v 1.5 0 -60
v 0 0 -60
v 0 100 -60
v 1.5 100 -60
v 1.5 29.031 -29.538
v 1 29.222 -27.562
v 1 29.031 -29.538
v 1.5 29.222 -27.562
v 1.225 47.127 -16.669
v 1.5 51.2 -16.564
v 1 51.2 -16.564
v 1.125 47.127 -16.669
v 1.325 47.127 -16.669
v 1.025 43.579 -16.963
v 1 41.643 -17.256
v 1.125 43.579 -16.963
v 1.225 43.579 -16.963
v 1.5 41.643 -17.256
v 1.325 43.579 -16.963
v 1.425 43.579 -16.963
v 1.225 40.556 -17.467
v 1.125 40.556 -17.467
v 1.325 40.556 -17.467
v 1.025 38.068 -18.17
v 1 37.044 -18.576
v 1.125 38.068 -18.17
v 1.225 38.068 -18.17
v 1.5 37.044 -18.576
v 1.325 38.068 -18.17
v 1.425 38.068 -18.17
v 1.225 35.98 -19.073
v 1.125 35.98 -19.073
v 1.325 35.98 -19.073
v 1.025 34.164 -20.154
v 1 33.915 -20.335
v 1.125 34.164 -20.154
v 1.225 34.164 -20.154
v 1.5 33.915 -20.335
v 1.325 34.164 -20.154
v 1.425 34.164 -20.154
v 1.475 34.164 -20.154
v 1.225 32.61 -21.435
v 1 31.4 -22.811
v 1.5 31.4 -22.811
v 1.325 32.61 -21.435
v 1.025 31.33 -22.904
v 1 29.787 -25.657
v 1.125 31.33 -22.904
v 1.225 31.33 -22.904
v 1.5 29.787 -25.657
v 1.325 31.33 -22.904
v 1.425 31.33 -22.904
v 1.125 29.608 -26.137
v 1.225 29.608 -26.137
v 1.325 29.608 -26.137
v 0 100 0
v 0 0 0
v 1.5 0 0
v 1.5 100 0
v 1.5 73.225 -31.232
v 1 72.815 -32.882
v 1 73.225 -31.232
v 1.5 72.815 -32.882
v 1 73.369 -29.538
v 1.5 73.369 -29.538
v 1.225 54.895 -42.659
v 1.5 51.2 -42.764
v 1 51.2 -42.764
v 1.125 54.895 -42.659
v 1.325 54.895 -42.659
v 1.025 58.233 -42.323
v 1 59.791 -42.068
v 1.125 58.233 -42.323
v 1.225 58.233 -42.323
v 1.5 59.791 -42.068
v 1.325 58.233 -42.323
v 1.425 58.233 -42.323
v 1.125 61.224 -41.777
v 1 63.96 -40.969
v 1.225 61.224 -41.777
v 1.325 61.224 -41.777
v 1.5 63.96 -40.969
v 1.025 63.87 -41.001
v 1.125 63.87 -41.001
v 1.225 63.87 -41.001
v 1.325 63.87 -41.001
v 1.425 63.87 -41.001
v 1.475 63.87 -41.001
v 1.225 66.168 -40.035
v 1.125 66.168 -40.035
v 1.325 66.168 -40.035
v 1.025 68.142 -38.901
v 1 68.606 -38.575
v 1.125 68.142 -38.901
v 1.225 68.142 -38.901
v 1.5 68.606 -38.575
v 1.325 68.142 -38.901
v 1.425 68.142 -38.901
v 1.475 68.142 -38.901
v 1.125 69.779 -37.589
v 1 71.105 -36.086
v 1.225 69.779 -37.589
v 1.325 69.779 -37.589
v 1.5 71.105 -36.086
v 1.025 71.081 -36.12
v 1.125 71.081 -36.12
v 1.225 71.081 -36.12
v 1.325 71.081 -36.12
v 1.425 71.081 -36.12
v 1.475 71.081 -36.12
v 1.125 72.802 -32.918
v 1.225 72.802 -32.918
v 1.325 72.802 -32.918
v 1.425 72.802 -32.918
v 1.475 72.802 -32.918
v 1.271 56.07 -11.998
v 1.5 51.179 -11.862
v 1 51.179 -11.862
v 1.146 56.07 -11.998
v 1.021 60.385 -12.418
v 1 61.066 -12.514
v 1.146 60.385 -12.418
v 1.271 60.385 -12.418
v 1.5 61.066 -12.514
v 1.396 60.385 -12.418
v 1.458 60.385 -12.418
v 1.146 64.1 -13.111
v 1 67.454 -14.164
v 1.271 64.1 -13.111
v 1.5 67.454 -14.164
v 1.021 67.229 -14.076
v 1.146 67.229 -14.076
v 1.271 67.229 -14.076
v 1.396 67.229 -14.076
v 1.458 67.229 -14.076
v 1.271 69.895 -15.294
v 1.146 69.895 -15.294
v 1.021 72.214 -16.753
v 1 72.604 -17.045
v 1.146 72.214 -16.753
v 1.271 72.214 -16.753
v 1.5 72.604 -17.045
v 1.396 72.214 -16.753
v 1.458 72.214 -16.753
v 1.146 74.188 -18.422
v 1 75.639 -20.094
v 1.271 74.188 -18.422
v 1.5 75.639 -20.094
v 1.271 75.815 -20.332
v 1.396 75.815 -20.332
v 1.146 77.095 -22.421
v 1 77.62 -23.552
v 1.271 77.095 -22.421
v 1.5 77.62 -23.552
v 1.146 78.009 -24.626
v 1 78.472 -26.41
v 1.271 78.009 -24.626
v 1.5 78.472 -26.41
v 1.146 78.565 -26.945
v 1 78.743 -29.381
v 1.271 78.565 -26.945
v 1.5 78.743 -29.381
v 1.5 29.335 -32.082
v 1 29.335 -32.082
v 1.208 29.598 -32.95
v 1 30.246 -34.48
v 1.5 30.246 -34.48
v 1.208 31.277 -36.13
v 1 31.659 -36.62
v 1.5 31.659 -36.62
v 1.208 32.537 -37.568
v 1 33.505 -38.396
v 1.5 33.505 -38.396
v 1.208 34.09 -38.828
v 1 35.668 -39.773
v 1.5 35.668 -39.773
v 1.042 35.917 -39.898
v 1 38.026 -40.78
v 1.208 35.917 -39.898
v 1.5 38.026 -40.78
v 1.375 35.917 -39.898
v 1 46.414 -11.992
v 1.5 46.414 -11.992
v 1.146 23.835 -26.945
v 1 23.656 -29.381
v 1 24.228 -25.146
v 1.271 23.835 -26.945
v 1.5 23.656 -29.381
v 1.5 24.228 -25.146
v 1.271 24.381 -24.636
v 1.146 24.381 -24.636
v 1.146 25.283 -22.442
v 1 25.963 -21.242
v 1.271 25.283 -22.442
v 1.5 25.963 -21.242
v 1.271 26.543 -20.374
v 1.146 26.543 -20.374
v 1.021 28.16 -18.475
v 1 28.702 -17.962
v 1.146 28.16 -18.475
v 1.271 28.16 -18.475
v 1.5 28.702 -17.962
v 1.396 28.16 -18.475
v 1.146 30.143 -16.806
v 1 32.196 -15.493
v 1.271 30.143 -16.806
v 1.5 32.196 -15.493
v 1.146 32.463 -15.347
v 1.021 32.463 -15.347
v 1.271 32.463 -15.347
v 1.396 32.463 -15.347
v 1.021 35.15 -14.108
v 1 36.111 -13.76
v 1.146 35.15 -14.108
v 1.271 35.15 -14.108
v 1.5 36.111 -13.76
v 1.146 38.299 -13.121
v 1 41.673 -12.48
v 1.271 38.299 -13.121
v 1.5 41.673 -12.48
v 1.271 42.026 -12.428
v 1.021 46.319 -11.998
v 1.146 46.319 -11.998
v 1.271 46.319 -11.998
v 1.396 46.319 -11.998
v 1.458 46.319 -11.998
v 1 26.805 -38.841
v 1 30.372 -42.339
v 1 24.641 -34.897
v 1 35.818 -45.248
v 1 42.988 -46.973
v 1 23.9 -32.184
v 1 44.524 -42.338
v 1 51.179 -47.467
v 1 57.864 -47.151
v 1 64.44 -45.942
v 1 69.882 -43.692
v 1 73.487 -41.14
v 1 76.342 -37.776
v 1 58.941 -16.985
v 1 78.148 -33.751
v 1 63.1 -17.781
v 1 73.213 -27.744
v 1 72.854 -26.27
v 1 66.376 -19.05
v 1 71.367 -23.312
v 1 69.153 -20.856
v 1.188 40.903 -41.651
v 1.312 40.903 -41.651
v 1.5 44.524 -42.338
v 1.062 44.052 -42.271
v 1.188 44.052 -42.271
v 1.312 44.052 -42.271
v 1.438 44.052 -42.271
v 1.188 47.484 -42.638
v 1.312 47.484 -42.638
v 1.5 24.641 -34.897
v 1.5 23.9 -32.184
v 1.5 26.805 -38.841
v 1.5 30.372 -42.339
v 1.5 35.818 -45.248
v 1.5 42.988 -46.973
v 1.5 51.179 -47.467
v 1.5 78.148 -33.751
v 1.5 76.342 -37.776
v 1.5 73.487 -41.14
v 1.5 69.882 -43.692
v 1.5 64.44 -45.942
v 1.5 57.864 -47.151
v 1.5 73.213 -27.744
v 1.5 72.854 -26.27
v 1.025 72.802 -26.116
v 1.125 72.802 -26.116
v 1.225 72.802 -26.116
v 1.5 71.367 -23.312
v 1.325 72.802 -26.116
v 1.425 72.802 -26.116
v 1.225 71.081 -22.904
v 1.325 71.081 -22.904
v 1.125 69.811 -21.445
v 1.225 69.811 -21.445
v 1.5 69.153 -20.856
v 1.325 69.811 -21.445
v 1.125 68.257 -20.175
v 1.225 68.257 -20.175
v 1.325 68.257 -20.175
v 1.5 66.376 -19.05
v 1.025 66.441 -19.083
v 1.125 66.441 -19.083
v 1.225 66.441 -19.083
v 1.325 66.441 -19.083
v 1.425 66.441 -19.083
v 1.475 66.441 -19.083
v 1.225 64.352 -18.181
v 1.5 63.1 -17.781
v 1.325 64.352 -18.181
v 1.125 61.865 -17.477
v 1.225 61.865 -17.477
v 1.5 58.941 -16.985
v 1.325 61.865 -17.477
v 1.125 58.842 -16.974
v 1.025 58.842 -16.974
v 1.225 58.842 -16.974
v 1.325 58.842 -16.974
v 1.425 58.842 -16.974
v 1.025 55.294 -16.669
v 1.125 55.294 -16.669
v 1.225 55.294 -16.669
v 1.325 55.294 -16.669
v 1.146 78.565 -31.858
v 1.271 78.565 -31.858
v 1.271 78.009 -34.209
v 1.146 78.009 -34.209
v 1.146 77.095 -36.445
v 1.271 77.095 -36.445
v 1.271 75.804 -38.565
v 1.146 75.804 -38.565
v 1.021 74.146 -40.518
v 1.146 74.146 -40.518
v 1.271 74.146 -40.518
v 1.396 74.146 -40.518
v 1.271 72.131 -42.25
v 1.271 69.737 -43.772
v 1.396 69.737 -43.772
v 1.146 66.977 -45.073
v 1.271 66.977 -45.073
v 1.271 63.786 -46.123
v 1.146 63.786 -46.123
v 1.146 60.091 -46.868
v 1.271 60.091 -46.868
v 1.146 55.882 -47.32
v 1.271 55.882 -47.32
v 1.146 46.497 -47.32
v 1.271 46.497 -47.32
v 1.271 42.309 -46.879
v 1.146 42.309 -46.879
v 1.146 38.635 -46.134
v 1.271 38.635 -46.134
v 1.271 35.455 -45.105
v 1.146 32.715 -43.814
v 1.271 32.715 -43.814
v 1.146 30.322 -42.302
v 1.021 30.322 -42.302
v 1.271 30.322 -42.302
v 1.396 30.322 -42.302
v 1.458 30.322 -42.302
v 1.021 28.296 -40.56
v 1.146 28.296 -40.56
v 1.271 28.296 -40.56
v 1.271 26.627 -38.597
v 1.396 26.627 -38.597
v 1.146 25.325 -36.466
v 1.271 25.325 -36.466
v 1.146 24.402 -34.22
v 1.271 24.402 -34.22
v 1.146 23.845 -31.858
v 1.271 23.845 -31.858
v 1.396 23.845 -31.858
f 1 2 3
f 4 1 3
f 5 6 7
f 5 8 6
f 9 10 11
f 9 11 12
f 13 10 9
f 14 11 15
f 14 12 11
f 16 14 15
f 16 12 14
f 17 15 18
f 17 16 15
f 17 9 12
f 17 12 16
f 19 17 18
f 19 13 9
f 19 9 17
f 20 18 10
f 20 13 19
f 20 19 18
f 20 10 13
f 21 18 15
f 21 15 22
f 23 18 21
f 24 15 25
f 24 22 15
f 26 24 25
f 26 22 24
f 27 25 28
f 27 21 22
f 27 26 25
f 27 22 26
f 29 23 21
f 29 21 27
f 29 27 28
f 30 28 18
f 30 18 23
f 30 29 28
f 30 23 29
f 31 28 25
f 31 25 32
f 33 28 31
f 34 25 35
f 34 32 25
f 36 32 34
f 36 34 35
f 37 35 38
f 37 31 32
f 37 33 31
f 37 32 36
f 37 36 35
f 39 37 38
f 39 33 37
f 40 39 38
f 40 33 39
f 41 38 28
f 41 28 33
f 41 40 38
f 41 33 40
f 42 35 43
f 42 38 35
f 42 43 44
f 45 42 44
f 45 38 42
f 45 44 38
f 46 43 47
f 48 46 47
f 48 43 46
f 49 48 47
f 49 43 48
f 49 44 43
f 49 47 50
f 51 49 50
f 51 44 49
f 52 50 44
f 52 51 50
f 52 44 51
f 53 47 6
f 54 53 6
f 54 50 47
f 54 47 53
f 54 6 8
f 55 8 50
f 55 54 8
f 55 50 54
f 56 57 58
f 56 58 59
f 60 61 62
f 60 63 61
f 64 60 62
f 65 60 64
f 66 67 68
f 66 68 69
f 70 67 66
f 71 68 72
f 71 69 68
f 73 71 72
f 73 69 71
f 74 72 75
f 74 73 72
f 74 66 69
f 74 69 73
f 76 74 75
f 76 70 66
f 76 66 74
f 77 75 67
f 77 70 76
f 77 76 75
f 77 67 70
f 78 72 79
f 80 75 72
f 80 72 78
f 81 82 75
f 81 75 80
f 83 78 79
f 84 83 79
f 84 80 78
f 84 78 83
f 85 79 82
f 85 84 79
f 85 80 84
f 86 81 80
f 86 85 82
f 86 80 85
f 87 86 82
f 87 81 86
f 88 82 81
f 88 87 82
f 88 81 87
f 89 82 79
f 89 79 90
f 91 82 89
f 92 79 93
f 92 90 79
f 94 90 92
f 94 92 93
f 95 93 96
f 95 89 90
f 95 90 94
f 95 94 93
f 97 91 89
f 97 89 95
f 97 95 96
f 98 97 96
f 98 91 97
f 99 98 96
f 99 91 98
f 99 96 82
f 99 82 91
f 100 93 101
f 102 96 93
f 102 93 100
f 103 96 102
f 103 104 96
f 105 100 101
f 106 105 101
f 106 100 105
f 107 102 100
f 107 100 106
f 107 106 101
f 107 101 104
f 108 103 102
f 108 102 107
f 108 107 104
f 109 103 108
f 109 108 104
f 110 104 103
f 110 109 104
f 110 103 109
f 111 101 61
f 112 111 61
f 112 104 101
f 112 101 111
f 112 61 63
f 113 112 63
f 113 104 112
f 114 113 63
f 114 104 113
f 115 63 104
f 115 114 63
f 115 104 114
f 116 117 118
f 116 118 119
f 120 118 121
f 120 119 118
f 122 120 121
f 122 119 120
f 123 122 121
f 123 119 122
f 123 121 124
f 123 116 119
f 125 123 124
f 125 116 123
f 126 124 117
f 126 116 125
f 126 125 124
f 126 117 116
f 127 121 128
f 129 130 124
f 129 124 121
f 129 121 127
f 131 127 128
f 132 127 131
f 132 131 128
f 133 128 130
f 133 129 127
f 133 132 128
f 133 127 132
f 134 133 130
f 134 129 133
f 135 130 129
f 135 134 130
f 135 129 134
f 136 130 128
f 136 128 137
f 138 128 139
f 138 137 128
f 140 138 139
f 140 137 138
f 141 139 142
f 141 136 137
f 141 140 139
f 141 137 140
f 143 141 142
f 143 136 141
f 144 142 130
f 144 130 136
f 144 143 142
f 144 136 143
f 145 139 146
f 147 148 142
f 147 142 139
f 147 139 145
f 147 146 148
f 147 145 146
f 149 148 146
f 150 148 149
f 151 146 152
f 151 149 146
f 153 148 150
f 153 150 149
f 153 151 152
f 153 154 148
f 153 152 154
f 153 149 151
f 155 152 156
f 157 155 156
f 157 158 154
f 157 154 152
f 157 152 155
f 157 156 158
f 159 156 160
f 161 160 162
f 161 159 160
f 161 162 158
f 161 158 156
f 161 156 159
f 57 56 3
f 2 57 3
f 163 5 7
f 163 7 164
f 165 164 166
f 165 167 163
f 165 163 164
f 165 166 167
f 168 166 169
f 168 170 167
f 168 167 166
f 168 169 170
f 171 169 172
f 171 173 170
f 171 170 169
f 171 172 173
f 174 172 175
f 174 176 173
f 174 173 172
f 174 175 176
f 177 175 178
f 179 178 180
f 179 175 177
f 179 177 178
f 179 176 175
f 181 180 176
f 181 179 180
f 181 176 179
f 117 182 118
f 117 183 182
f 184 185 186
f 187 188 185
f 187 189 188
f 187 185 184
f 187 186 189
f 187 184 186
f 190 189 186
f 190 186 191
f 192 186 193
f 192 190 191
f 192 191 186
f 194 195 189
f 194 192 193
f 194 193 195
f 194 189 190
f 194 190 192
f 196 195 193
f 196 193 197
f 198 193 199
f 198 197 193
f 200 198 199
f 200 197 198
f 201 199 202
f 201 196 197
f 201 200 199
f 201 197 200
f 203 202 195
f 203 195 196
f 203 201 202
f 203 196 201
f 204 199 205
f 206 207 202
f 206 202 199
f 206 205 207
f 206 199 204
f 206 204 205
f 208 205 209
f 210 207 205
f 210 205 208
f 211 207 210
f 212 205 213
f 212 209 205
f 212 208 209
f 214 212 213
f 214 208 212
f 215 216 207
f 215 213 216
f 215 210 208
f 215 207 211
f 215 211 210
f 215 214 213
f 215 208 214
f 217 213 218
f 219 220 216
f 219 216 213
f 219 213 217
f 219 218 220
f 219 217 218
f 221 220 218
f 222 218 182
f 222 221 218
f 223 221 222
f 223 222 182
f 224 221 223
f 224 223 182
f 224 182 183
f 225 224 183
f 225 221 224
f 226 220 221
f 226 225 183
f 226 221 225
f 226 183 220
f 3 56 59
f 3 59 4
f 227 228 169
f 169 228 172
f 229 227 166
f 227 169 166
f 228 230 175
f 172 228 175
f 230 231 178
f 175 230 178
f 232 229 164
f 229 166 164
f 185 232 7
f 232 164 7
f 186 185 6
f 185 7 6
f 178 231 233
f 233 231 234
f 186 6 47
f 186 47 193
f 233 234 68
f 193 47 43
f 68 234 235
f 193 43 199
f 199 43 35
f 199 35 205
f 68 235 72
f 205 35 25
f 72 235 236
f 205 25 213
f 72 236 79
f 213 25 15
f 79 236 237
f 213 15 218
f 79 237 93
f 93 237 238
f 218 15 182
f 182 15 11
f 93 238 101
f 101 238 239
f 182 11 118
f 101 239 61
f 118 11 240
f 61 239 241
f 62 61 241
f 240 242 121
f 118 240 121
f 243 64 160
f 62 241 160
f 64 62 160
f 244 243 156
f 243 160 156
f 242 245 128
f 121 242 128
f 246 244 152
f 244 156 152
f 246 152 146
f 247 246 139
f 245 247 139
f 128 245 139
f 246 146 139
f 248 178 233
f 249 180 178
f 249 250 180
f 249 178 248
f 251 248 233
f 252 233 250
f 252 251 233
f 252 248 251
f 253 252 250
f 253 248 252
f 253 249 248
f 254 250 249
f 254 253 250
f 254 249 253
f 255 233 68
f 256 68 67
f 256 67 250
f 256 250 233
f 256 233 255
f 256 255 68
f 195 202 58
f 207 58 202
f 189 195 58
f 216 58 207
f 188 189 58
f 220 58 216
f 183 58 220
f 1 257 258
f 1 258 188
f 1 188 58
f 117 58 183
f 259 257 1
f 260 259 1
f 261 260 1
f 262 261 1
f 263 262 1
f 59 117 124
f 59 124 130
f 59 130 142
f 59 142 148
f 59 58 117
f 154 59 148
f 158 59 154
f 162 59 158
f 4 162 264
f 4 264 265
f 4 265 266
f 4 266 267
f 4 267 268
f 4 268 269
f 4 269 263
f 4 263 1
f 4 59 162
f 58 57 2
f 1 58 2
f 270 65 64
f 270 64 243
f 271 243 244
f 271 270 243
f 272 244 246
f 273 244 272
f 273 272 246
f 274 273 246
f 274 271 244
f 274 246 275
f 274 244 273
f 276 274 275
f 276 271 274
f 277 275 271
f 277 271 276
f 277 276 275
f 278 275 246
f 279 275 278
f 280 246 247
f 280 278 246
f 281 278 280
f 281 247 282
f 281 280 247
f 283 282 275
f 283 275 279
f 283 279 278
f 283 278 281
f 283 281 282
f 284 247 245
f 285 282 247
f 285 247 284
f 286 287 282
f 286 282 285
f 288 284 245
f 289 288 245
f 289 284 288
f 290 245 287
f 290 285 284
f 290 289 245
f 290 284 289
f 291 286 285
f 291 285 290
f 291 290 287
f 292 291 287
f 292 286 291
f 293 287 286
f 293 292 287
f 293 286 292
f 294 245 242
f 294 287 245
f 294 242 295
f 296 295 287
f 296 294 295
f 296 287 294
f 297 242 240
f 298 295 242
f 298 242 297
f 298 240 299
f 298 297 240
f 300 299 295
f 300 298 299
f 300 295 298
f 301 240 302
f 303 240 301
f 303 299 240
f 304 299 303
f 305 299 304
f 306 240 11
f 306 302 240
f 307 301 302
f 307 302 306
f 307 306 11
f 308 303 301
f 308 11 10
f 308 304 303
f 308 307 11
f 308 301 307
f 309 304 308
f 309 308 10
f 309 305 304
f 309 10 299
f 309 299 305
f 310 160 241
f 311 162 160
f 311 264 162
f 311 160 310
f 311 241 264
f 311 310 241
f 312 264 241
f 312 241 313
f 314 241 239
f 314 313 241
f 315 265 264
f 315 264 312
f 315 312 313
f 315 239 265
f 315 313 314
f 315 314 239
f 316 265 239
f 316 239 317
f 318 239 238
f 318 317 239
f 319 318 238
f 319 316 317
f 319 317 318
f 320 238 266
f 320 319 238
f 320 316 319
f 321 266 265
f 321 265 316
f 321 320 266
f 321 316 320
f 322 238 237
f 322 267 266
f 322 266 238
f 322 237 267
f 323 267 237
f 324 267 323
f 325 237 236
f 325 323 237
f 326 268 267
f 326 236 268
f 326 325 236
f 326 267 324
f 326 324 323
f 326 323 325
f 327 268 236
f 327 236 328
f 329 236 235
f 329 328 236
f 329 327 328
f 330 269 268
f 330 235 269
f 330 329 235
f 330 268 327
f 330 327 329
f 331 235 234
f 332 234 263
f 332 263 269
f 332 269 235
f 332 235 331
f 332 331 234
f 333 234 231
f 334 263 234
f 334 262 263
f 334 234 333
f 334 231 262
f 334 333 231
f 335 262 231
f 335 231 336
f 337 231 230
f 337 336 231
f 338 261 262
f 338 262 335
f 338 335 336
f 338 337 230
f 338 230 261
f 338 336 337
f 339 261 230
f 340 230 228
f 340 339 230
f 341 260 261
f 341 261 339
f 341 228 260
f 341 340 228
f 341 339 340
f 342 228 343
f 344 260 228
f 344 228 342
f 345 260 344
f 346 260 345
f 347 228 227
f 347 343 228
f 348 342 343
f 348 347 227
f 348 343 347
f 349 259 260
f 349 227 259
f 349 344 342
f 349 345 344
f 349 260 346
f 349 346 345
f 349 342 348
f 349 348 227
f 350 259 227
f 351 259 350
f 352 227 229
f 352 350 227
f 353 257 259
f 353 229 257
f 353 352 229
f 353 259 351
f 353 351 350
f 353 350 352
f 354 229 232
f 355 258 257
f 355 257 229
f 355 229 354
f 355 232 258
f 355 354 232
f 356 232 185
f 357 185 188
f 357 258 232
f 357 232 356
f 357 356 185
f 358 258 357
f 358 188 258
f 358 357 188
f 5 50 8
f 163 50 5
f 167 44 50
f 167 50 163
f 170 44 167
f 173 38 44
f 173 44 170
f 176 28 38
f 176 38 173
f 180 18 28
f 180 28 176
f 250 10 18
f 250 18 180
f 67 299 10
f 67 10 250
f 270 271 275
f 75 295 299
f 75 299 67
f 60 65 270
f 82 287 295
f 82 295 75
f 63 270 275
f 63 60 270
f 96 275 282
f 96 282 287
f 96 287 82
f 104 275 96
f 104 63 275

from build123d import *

# Parameters (mm, degrees)
SKETCH1_W           = 60
SKETCH1_H           = 100
BOSS_EXTRUDE1_DEPTH = 1.5
CUT_EXTRUDE1_DEPTH  = 0.5


with BuildPart() as part:
    # Sketch1 → Boss-Extrude1 (new body)
    with BuildSketch(Plane(origin=(0, 0, 0), x_dir=(0, 0, -1), z_dir=(1, 0, 0))):
        with Locations((30, 50)):
            Rectangle(SKETCH1_W, SKETCH1_H)
    extrude(amount=BOSS_EXTRUDE1_DEPTH)

    # Sketch2 → Cut-Extrude1 (cut)
    with BuildSketch(Plane(origin=(1.5, 0, 0), x_dir=(0, 0, -1), z_dir=(1, 0, 0))):
        with BuildLine():
            add(Edge.make_bspline(
                [(11.861572266, 51.178957621), (11.866483157, 52.01881409), (11.876022634, 53.650247385), (11.982146224, 56.027475881), (12.158439592, 58.257620052), (12.400038666, 60.340786644), (12.694046737, 62.277513452), (13.08652929, 64.062624774), (13.532868703, 65.704382682), (14.050167214, 67.208140834), (14.633869024, 68.594158719), (15.269169344, 69.888065036), (15.981280939, 71.087902015), (16.729505327, 72.212819981), (17.544130252, 73.244404803), (18.401973402, 74.197224604), (19.336516322, 75.049258251), (20.315990392, 75.825470017), (21.349263533, 76.505912268), (22.406883193, 77.105258438), (23.496129033, 77.617278353), (24.619974934, 78.019865843), (25.768319661, 78.352393329), (26.945177551, 78.57979315), (28.152491721, 78.722873456), (28.967406541, 78.736552342), (29.380690257, 78.743489583)],
                knots=[0, 0, 0, 0, 1.646270934, 3.197905019, 4.663502075, 6.030701355, 7.308322542, 8.50163776, 9.611534131, 10.641858119, 11.616356847, 12.558055219, 13.465016945, 14.349605745, 15.204443733, 16.039544428, 16.859896111, 17.680448484, 18.487036065, 19.28249412, 20.06191084, 20.843045899, 21.620316918, 22.403196591, 23.190181807, 24, 24, 24, 24], degree=3))
            add(Edge.make_bspline(
                [(29.380690257, 78.743489583), (29.797426358, 78.736186307), (30.626183347, 78.721662388), (31.851448395, 78.582069908), (33.048407114, 78.350445526), (34.211956508, 78.022257832), (35.351654181, 77.61510046), (36.458585764, 77.104768572), (37.539626914, 76.510720351), (38.577598427, 75.812695603), (39.583895365, 75.034448119), (40.53380024, 74.15468866), (41.427399518, 73.182300389), (42.275908223, 72.127687021), (43.055253425, 70.97062105), (43.797437142, 69.731226973), (44.46174867, 68.387830244), (45.101546615, 66.962845324), (45.653796473, 65.416843713), (46.151838759, 63.758540103), (46.554254567, 61.968347042), (46.889453334, 60.055657106), (47.149130721, 58.01344602), (47.338259067, 55.846091507), (47.438164497, 53.552167648), (47.456979074, 51.983795915), (47.466634115, 51.178957621)],
                knots=[0, 0, 0, 0, 0.810914788, 1.612654377, 2.396697861, 3.181598691, 3.963628158, 4.749916497, 5.551656086, 6.361998678, 7.18212741, 8.025565596, 8.878627764, 9.750805457, 10.657531673, 11.591944965, 12.560506719, 13.57287815, 14.630710178, 15.753379473, 16.941251878, 18.199788006, 19.531962791, 20.947069417, 22.433333509, 24, 24, 24, 24], degree=3))
            add(Edge.make_bspline(
                [(47.466634115, 51.178957621), (47.456878981, 50.37762975), (47.437871502, 48.816275072), (47.339379047, 46.532672726), (47.145370188, 44.376820324), (46.902683958, 42.343547476), (46.566561596, 40.441316956), (46.153273591, 38.663546241), (45.694395327, 37.002558092), (45.127955466, 35.471959765), (44.507979129, 34.050399477), (43.833439735, 32.722928074), (43.110772828, 31.477812184), (42.323445656, 30.325018121), (41.484247548, 29.256379647), (40.575217204, 28.290759896), (39.621979364, 27.404892058), (38.612721076, 26.616623447), (37.558561531, 25.926669372), (36.481233359, 25.309640305), (35.361621363, 24.812100312), (34.225098132, 24.38489078), (33.055407059, 24.05850748), (31.854006192, 23.83283075), (30.627006546, 23.674555371), (29.797567518, 23.662481237), (29.380690257, 23.65641276)],
                knots=[0, 0, 0, 0, 1.561518951, 3.042555995, 4.452378317, 5.7783523, 7.031515105, 8.214008947, 9.334062868, 10.386615937, 11.391082383, 12.354592575, 13.286541444, 14.194233754, 15.072674879, 15.931287219, 16.775624067, 17.606195743, 18.42308326, 19.229000347, 20.022332153, 20.807536673, 21.593273796, 22.3848459, 23.188221202, 24, 24, 24, 24], degree=3))
            add(Edge.make_bspline(
                [(29.380690257, 23.65641276), (28.967418006, 23.663394755), (28.152525794, 23.677161885), (26.945046018, 23.819595771), (25.773048192, 24.048590878), (24.630748974, 24.369227439), (23.512287804, 24.761700257), (22.43290541, 25.273028738), (21.380600335, 25.861914845), (20.358180088, 26.532565047), (19.384856977, 27.300922528), (18.455153875, 28.150763438), (17.592426626, 29.103295021), (16.789449091, 30.143476845), (16.026295593, 31.261739303), (15.324295998, 32.473350402), (14.674973564, 33.773505919), (14.081454981, 35.170605749), (13.555230257, 36.685036704), (13.090402579, 38.334124188), (12.723391305, 40.132423503), (12.409247074, 42.06549134), (12.155865354, 44.141634314), (11.98288092, 46.361979541), (11.875965432, 48.725143407), (11.866457538, 50.346093579), (11.861572266, 51.178957621)],
                knots=[0, 0, 0, 0, 0.810891512, 1.598919785, 2.382837074, 3.152667961, 3.926044502, 4.706494248, 5.493654104, 6.291793342, 7.103789334, 7.925228297, 8.761435821, 9.622817696, 10.50288917, 11.416980706, 12.369136599, 13.353924996, 14.394355917, 15.514179734, 16.714354668, 17.994756427, 19.357759367, 20.818452758, 22.365282078, 24, 24, 24, 24], degree=3))
        make_face()
        with BuildLine():
            add(Edge.make_bspline(
                [(16.564127604, 51.199951172), (16.565915894, 50.500057671), (16.569386614, 49.141701818), (16.660056419, 47.167823532), (16.783573948, 45.326785469), (16.942889072, 43.616249997), (17.179481346, 42.042007029), (17.444576761, 40.593229331), (17.767181844, 39.277584005), (18.148877972, 38.086043002), (18.583633926, 36.998384689), (19.058315115, 35.986299812), (19.568251845, 35.037832588), (20.138948921, 34.161502485), (20.760487566, 33.354451704), (21.418828848, 32.602395844), (22.138542767, 31.931722288), (23.134196943, 31.127356015), (24.448633139, 30.296156819), (26.104776297, 29.572348137), (27.80655222, 29.117480208), (28.961614497, 29.05963437), (29.538141886, 29.030761719)],
                knots=[0, 0, 0, 0, 1.459021318, 2.831673884, 4.118529203, 5.306027144, 6.411944654, 7.436330062, 8.375795394, 9.233974572, 10.042671642, 10.816086306, 11.563610507, 12.285937304, 12.993564865, 13.685989202, 14.367179055, 15.041617293, 16.353048772, 17.594441528, 18.799311195, 20, 20, 20, 20], degree=3))
            add(Edge.make_bspline(
                [(29.538141886, 29.030761719), (30.118398518, 29.054682735), (31.277713767, 29.102475381), (32.971485144, 29.563575618), (34.615798123, 30.259289713), (35.904415627, 31.081930832), (36.884781023, 31.865359219), (37.58719408, 32.533302994), (38.23189326, 33.281212299), (38.843356327, 34.088160254), (39.404171158, 34.969563803), (39.91414404, 35.921184585), (40.379505291, 36.945665225), (40.644634513, 37.660845129), (40.780188243, 38.026498159)],
                knots=[0, 0, 0, 0, 1.353760809, 2.704726607, 4.075137775, 5.516104923, 6.260822281, 7.007110065, 7.778089737, 8.566572457, 9.372053459, 10.217411131, 11.088608312, 12, 12, 12, 12], degree=3))
            add(Edge.make_bspline(
                [(40.780188243, 38.026498159), (40.938162986, 38.494051101), (41.258919464, 39.443384088), (41.6723064, 40.916025735), (41.997865484, 42.461115664), (42.290756471, 44.069420128), (42.490670421, 45.752799943), (42.65158024, 47.506046538), (42.746359491, 49.330481818), (42.758108313, 50.570038805), (42.764078776, 51.199951172)],
                knots=[0, 0, 0, 0, 0.884706709, 1.796334032, 2.740027952, 3.714592787, 4.726048262, 5.777819803, 6.87074269, 8, 8, 8, 8], degree=3))
            add(Edge.make_bspline(
                [(42.764078776, 51.199951172), (42.755841673, 51.829761655), (42.739728137, 53.061805598), (42.678135979, 54.866131568), (42.519086189, 56.579874281), (42.342436853, 58.210416604), (42.081976085, 59.748732555), (41.801145443, 61.20770012), (41.423847996, 62.569244583), (41.020821259, 63.854682782), (40.559546483, 65.049410354), (40.051780436, 66.158997545), (39.509489973, 67.188801219), (38.920481528, 68.135995951), (38.29174733, 69.004824402), (37.606692727, 69.777866606), (36.892491448, 70.479081622), (35.892144588, 71.279491165), (34.582531947, 72.095607599), (32.952960149, 72.84665929), (31.25713995, 73.277959781), (30.110728088, 73.338768925), (29.538141886, 73.369140625)],
                knots=[0, 0, 0, 0, 1.31362396, 2.569729283, 3.763502607, 4.902122613, 5.988968491, 7.01645872, 7.998833611, 8.933434873, 9.825090667, 10.667526885, 11.477055099, 12.250526234, 12.991942729, 13.710640831, 14.402115721, 15.076753259, 16.378508321, 17.609869233, 18.806226677, 20, 20, 20, 20], degree=3))
            add(Edge.make_bspline(
                [(29.538141886, 73.369140625), (28.958590102, 73.338727023), (27.798430729, 73.277844414), (26.084984543, 72.848266218), (24.442556739, 72.099502066), (23.13640721, 71.27678808), (22.135362672, 70.493210249), (21.430468804, 69.81371146), (20.769538772, 69.070437494), (20.160686339, 68.25596463), (19.590436419, 67.380656191), (19.066721664, 66.437626156), (18.594863093, 65.422095624), (18.159426849, 64.334925875), (17.776566393, 63.14348767), (17.460760218, 61.8294629), (17.169011738, 60.385293269), (16.96247724, 58.802524157), (16.778871639, 57.091560249), (16.660876821, 55.245926125), (16.569083308, 53.268737372), (16.565812591, 51.903358229), (16.564127604, 51.199951172)],
                knots=[0, 0, 0, 0, 1.207732386, 2.417664972, 3.655092373, 4.956220595, 5.625982001, 6.301752483, 6.994047911, 7.697131622, 8.419323945, 9.170223765, 9.943494443, 10.752040957, 11.610060368, 12.549350801, 13.567764191, 14.679664412, 15.874934091, 17.154273443, 18.533957287, 20, 20, 20, 20], degree=3))
        make_face(mode=Mode.SUBTRACT)
    extrude(amount=-CUT_EXTRUDE1_DEPTH, mode=Mode.SUBTRACT)


solid = part.part
